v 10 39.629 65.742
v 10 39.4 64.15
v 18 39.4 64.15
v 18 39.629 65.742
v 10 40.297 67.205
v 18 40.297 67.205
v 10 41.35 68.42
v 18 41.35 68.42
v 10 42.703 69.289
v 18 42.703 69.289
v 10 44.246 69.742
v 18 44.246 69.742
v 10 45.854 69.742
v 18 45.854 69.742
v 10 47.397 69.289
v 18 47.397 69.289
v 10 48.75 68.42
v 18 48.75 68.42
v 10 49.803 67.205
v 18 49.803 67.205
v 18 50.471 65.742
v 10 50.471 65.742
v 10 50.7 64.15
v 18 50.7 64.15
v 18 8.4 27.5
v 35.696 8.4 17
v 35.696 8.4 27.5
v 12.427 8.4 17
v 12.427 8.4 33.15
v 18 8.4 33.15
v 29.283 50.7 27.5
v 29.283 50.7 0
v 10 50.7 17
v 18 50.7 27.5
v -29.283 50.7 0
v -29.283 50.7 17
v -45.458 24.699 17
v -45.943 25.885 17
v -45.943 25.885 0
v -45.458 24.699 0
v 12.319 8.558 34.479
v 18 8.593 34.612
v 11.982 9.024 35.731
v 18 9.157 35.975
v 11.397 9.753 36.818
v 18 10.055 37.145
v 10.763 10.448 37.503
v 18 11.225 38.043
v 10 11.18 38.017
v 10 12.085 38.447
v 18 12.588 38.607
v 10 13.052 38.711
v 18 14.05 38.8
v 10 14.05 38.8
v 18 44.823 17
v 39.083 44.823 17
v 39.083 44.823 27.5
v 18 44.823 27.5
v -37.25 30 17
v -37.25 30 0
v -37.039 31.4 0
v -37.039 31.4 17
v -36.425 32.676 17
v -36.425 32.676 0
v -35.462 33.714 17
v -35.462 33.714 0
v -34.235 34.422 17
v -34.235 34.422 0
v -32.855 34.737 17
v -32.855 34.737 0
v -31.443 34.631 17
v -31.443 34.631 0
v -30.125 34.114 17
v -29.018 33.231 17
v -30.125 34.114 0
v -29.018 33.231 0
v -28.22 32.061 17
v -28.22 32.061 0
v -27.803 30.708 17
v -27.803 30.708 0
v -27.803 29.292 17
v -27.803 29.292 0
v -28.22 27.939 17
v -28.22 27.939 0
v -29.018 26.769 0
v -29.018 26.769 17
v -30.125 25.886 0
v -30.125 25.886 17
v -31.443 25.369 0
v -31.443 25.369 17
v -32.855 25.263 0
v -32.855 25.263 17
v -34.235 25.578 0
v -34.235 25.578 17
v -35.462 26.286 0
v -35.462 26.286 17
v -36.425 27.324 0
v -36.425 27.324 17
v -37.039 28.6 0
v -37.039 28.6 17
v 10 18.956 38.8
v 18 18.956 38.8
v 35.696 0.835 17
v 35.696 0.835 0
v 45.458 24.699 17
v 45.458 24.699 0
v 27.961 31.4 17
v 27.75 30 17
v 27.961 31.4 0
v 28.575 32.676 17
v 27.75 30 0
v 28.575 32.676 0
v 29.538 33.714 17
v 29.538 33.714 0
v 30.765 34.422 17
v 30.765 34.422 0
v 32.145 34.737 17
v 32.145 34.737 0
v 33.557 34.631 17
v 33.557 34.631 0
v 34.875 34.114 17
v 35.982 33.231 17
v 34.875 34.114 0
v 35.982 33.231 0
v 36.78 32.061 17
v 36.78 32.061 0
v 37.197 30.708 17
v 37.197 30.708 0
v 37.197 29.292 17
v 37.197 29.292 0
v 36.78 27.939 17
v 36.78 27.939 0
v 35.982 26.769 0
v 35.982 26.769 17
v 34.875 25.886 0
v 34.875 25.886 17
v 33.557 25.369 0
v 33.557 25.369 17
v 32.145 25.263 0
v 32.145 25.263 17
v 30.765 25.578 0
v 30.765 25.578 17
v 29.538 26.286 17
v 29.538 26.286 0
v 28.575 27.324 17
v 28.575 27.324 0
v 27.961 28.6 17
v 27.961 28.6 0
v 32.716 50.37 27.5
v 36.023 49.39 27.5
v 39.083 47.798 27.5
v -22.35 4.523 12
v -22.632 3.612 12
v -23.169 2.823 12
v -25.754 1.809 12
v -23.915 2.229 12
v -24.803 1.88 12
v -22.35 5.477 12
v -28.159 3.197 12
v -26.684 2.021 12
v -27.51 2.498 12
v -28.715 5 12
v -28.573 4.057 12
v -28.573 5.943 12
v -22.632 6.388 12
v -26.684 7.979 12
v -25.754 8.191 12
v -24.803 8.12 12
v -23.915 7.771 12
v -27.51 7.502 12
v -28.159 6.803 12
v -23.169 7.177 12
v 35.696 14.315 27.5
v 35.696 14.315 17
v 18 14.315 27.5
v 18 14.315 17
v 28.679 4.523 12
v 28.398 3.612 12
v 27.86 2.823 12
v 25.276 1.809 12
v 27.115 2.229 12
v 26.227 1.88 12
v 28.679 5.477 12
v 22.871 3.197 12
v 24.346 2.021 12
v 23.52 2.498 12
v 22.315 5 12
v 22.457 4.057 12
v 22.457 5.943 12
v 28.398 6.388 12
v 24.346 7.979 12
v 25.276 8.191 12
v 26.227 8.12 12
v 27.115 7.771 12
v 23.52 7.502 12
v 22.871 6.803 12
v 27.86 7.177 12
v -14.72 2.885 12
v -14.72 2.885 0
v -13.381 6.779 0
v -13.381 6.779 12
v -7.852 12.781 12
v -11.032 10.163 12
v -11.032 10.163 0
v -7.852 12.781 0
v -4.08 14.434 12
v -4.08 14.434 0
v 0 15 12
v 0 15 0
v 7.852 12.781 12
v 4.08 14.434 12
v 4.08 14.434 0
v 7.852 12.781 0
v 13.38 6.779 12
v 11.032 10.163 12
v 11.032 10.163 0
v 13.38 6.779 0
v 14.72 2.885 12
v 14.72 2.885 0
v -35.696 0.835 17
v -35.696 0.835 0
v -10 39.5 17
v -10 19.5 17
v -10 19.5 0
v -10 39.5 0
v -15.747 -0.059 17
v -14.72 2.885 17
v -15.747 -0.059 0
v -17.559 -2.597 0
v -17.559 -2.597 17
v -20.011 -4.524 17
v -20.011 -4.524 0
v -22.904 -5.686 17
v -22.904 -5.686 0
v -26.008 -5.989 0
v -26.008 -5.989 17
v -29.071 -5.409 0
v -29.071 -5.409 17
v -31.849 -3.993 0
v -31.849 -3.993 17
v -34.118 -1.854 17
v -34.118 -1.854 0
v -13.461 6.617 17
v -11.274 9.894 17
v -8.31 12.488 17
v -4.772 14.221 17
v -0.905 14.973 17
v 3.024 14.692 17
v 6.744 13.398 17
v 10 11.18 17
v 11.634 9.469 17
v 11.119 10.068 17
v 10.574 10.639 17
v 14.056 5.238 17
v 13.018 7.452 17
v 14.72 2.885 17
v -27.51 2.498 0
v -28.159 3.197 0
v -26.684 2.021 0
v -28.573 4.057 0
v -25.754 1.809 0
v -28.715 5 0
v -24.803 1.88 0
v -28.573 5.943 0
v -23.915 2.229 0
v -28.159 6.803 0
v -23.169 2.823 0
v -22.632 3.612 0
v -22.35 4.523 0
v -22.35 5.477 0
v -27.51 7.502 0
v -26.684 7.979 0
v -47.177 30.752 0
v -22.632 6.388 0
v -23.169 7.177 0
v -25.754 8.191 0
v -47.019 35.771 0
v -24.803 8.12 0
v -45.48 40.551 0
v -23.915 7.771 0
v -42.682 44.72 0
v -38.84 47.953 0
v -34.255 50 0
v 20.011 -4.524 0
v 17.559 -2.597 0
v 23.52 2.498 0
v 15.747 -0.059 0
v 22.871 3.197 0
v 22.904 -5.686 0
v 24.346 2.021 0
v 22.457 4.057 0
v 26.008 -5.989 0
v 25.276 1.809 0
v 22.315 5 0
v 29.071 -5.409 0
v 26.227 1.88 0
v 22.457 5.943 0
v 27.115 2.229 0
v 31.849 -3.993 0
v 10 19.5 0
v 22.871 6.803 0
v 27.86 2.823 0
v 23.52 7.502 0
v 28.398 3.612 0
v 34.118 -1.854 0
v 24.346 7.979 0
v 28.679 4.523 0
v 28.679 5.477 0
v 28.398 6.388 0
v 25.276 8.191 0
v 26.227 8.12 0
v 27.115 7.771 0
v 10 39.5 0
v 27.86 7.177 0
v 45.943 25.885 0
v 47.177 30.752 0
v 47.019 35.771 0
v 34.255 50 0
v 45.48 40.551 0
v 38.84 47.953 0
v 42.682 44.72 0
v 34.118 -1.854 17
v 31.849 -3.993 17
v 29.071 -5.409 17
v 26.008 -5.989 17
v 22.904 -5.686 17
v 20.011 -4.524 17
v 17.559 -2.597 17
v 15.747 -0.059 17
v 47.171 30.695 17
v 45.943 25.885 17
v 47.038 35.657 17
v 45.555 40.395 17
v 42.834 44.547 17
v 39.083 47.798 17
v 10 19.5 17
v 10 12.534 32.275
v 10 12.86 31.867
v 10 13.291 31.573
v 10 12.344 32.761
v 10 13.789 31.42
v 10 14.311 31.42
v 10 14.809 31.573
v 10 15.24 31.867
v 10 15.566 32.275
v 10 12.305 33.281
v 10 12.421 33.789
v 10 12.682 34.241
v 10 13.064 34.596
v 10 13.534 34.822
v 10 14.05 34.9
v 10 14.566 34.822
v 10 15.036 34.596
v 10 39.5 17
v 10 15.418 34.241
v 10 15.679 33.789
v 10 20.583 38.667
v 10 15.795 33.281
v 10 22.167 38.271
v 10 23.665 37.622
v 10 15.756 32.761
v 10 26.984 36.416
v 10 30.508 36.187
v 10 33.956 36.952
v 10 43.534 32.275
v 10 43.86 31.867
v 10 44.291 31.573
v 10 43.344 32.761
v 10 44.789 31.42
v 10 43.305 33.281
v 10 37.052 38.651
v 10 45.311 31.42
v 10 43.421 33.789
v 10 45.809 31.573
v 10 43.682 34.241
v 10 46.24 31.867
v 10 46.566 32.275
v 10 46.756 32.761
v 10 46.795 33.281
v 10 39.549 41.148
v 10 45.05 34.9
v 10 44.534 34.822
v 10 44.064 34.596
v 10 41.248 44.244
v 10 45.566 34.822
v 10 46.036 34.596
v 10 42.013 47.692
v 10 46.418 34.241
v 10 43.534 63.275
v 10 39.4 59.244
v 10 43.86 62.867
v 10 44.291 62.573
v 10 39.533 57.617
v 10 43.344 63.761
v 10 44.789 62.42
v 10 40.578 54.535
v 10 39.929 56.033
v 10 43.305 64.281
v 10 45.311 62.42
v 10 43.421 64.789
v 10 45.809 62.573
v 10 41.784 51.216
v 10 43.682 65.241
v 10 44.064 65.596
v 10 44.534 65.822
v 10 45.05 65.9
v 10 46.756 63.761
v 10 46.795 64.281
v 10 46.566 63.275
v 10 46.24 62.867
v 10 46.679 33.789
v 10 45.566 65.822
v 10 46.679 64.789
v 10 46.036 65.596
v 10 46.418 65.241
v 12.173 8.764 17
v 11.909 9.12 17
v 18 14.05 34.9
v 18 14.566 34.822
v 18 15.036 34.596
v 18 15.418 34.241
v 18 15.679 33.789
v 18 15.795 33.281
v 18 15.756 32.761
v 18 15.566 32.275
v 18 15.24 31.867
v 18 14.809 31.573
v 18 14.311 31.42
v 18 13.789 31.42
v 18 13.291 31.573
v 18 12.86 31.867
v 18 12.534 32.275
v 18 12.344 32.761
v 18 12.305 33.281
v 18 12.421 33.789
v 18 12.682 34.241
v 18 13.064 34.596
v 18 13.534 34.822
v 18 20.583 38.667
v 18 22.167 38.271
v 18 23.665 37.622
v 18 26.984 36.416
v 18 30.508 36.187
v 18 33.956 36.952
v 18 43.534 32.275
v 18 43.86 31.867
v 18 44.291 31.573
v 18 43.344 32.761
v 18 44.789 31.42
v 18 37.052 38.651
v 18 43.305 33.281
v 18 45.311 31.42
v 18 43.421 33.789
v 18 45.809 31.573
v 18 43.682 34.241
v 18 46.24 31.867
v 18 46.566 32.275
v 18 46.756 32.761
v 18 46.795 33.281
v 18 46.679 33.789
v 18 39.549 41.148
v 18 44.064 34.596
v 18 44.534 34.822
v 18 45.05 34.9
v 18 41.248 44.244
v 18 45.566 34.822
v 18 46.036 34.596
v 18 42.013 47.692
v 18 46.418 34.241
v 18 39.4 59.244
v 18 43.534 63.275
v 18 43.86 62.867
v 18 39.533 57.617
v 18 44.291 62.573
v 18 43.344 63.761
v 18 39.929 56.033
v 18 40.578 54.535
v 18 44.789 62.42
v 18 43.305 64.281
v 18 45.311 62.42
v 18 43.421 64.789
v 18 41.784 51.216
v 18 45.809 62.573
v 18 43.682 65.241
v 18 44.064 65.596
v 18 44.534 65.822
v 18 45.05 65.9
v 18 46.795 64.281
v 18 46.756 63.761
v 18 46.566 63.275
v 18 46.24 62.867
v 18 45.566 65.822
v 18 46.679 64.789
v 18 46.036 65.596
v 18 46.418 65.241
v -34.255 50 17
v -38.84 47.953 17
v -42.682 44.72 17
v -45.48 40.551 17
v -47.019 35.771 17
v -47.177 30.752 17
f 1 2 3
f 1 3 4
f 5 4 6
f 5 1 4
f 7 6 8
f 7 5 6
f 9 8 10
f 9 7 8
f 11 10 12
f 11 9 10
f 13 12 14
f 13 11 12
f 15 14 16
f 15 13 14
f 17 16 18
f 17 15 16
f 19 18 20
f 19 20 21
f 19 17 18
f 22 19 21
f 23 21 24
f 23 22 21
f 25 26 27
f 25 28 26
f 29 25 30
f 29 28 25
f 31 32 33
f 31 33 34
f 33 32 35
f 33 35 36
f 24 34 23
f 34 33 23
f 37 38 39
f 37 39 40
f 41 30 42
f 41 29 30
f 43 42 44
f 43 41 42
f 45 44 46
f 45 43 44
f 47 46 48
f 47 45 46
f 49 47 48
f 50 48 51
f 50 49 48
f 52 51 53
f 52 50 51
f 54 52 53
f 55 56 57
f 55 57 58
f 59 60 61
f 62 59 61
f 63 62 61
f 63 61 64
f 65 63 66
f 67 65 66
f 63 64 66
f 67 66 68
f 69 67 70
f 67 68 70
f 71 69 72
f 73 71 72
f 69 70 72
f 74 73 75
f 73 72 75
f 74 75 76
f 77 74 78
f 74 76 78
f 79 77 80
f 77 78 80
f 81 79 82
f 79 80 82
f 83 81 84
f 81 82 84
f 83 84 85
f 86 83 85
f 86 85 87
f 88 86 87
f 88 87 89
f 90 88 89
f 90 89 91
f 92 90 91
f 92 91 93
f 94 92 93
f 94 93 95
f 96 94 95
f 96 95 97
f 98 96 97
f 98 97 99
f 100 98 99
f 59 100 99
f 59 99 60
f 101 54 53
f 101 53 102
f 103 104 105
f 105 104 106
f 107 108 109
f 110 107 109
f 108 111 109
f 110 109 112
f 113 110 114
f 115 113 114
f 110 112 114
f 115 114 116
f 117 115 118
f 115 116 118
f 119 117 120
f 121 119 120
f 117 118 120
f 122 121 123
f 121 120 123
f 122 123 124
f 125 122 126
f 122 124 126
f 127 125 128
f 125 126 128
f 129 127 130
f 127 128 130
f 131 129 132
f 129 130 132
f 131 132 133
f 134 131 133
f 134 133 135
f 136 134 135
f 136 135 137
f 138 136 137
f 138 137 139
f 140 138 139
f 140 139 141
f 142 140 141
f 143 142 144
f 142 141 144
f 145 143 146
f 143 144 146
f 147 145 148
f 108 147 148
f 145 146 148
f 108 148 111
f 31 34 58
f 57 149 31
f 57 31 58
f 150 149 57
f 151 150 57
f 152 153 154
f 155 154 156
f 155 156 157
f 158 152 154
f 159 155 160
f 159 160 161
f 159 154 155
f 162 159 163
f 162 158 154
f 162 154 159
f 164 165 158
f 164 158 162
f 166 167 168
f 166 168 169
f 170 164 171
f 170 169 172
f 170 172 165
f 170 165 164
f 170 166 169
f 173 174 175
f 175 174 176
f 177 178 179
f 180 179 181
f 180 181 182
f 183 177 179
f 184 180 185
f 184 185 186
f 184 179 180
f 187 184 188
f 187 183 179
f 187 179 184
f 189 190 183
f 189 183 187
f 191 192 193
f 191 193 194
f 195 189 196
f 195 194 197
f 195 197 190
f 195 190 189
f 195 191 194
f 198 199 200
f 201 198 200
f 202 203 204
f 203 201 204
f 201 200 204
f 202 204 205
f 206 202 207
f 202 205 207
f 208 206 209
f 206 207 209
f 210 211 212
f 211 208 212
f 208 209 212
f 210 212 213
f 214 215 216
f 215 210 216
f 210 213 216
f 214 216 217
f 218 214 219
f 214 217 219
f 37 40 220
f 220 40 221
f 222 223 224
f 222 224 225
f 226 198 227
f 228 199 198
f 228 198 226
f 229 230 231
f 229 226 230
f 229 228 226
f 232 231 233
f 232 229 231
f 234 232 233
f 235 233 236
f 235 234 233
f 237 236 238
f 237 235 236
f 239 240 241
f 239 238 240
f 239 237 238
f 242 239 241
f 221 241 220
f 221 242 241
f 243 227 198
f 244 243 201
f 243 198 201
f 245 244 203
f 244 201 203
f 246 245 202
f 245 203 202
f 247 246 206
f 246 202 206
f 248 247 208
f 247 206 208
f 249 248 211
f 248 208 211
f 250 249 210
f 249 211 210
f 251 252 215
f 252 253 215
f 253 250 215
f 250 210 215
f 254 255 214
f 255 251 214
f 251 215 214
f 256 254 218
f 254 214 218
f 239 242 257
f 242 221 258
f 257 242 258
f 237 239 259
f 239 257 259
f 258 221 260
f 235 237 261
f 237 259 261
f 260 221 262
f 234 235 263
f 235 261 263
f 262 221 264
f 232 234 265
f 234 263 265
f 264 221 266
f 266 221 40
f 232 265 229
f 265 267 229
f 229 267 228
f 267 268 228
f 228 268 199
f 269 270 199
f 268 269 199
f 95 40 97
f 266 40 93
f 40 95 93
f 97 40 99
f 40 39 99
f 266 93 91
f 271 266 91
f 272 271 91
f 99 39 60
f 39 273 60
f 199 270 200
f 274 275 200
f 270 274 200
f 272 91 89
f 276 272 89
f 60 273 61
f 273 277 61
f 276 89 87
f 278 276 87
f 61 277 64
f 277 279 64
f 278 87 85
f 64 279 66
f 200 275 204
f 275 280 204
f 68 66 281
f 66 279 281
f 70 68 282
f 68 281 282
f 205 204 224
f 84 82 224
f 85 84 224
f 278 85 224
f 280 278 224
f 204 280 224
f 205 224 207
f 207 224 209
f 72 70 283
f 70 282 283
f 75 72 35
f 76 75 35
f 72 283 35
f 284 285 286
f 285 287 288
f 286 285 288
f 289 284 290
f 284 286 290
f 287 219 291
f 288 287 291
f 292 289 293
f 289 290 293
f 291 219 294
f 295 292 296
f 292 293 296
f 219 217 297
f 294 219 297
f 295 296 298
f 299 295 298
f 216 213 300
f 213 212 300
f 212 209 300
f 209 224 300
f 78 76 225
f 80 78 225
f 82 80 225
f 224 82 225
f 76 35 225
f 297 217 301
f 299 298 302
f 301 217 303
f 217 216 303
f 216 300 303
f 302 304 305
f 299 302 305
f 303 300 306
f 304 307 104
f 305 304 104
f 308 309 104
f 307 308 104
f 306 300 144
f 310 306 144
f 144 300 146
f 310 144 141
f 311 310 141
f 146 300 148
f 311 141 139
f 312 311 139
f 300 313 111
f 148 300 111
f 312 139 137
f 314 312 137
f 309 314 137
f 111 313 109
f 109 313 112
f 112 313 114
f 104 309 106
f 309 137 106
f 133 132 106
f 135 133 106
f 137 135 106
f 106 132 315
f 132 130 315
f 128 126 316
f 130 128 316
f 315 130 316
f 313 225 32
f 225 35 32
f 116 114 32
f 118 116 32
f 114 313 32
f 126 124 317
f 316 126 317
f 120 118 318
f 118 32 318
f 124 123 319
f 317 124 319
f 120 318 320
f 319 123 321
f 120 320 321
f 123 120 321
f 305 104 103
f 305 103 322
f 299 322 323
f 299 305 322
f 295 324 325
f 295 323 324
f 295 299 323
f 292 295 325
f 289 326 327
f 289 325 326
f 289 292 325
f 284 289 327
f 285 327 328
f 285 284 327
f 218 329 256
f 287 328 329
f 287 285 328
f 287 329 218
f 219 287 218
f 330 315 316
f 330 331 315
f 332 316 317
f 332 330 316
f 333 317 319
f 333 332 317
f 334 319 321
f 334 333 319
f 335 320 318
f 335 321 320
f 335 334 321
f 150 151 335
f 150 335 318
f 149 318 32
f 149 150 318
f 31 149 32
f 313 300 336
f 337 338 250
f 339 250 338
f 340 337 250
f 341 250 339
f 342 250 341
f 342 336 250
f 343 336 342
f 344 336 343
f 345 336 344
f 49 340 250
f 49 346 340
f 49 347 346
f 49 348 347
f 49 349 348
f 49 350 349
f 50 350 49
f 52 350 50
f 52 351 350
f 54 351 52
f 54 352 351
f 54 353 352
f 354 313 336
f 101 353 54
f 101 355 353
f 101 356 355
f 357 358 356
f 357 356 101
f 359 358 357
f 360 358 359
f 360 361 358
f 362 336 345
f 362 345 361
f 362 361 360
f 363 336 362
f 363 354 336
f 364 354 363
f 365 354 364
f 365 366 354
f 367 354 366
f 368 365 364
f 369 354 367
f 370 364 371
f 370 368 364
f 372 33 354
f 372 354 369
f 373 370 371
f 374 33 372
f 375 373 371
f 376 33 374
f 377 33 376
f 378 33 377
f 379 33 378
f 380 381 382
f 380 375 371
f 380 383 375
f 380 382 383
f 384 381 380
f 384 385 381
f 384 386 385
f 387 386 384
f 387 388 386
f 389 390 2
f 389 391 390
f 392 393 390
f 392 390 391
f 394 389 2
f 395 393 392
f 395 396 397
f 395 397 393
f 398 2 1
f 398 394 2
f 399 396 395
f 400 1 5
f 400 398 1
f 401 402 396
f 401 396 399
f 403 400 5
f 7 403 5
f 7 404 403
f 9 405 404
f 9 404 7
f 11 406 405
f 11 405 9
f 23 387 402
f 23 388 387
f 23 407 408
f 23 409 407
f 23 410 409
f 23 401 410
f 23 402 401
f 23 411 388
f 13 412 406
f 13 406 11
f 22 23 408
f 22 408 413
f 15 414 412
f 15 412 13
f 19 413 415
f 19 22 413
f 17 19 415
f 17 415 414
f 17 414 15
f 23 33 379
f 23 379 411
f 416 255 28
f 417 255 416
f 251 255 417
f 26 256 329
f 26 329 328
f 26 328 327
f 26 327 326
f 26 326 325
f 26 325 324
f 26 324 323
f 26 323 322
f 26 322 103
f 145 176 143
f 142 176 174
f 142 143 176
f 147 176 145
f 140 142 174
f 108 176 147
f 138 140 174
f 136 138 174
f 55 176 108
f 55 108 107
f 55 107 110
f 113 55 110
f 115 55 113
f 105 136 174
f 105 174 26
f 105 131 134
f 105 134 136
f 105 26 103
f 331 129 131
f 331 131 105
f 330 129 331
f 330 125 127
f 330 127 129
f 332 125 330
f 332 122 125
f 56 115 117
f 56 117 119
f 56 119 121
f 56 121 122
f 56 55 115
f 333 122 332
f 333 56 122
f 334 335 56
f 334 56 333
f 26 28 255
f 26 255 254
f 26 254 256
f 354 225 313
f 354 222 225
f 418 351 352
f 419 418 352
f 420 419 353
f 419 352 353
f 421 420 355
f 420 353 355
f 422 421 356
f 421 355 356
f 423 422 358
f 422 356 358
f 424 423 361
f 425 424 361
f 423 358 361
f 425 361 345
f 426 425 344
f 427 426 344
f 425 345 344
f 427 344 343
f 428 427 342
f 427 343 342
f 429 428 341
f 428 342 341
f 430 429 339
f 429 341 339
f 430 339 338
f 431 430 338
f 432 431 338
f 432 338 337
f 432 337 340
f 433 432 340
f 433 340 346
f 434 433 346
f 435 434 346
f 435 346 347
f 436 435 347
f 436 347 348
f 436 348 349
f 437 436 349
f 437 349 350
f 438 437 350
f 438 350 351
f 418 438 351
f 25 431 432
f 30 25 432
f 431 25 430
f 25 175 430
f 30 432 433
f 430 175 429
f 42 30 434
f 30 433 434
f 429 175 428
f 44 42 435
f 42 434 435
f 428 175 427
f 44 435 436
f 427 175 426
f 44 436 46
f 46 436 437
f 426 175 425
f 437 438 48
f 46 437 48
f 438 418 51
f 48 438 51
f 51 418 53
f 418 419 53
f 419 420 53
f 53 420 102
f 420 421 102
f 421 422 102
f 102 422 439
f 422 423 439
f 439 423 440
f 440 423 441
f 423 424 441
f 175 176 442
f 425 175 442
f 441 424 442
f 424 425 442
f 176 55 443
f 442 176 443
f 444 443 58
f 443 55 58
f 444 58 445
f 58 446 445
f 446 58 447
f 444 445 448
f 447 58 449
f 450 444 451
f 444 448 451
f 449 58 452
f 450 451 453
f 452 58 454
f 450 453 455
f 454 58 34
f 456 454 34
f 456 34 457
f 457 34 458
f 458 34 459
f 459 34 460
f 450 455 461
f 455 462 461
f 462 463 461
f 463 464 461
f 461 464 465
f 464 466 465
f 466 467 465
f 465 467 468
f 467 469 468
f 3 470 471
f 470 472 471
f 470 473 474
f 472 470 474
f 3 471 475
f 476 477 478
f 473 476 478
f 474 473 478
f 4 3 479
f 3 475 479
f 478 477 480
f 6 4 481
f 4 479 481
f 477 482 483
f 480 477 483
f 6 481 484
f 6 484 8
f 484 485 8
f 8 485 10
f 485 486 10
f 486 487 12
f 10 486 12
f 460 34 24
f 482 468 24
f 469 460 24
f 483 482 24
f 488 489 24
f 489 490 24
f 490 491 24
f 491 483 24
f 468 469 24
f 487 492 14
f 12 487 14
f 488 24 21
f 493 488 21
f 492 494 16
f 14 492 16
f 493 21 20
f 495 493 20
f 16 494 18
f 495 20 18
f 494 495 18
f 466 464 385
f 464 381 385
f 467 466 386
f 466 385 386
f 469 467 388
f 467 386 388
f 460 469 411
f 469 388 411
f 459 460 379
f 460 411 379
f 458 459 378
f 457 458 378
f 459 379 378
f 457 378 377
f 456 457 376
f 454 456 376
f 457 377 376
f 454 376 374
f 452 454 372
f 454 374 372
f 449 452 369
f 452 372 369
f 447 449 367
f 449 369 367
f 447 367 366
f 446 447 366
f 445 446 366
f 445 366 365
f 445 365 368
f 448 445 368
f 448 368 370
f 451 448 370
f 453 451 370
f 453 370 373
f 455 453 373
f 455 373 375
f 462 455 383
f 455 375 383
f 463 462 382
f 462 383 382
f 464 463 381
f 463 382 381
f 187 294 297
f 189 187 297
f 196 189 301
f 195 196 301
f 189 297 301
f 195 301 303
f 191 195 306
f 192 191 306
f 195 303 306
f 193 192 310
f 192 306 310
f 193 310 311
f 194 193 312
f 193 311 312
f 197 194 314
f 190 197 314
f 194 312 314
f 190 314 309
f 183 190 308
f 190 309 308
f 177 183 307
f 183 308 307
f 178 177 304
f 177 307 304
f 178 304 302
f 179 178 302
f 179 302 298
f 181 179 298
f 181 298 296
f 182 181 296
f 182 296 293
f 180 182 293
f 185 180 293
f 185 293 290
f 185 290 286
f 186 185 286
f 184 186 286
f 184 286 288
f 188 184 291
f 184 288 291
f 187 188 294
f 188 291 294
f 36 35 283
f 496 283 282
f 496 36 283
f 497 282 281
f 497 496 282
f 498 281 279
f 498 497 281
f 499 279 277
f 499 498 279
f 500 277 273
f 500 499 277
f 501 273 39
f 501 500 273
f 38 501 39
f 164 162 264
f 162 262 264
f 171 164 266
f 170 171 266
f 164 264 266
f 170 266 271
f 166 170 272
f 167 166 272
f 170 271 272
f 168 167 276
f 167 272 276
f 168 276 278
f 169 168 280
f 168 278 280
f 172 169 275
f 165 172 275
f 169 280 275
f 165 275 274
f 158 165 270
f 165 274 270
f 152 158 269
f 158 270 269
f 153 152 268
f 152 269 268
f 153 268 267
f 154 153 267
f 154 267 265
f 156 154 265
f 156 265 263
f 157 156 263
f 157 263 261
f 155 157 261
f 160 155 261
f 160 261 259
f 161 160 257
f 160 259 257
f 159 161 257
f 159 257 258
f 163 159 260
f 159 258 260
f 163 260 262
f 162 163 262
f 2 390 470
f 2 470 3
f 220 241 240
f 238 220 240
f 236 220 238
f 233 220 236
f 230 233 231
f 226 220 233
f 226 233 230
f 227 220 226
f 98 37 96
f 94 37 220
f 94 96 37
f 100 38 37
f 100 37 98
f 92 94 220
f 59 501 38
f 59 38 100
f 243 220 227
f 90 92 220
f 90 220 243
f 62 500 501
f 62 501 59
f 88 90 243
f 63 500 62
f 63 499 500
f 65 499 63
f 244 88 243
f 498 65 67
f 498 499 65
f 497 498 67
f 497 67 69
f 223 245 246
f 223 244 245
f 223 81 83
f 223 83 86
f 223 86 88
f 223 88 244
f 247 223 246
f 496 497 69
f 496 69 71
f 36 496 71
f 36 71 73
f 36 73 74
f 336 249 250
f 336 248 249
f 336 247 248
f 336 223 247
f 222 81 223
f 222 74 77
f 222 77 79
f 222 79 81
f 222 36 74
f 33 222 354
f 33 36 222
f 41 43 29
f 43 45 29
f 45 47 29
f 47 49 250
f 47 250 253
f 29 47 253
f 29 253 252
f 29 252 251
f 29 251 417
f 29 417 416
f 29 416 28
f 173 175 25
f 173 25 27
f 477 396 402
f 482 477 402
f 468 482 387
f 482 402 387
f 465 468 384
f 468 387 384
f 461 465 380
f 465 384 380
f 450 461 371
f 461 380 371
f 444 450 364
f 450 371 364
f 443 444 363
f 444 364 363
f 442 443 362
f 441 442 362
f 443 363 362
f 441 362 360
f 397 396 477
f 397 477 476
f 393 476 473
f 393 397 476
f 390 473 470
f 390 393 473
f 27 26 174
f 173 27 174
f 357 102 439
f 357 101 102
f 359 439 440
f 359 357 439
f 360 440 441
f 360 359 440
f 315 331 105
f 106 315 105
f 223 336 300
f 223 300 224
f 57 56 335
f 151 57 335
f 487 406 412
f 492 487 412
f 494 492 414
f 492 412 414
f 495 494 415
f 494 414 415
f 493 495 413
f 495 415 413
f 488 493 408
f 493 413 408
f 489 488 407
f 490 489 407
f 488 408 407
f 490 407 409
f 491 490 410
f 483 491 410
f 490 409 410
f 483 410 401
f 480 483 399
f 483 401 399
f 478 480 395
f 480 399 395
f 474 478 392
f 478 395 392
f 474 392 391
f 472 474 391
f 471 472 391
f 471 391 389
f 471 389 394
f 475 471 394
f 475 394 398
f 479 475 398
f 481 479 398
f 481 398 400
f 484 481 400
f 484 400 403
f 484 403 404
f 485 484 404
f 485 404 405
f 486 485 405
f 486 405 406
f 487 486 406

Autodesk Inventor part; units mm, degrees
ref_plane "YZ Plane" through (0, 0, 0) normal (1, 0, 0) x (0, 1, 0)
ref_plane "XZ Plane" through (0, 0, 0) normal (0, 1, 0) x (-1, 0, 0)
ref_plane "XY Plane" through (0, 0, 0) normal (0, 0, 1) x (1, 0, 0)
sketch "Sketch1" plane through (0, 0, 0) normal (0, 0, 1) x (1, 0, 0)
  circle A0 centre (0, 0) radius 8
  circle A1 centre (25.5147, 5) radius 3
  circle A2 centre (-25.5147, 5) radius 3
  circle A3 centre (32.5, 30) radius 5
  circle A4 centre (-32.5, 30) radius 5
  arc A5 (45.4578, 24.6994) -> (32.5, 44) centre (32.5, 30) ccw
  arc A6 (-32.5, 44) -> (-45.4578, 24.6994) centre (-32.5, 30) ccw
  line L0 (-24.3676, 0) -> (22.7562, 0) construction
  line L1 (-38.3266, 30) -> (45.5284, 30) construction
  line L2 (-33.7528, 8) -> (48.0284, 8) construction
  circle A7 centre (-25.5147, 5) radius 6
  circle A8 centre (25.5147, 5) radius 6
  arc A9 (14.72, 2.8846) -> (-15, 0) centre (0, 0) ccw
  arc A10 (-35.6958, 0.8353) -> (-14.72, 2.8846) centre (-25.5147, 5) ccw
  arc A11 (14.72, 2.8846) -> (35.6958, 0.8353) centre (25.5147, 5) ccw
  line L3 (-45.4578, 24.6994) -> (-35.6958, 0.8353)
  line L4 (35.6958, 0.8353) -> (45.4578, 24.6994)
  line L5 (-32.5, 44) -> (32.5, 44)
  dimension "d0" = 65
  dimension "d1" = 32.5
  dimension "d2" = 10
  dimension "d3" = 10
  dimension "d4" = 6
  dimension "d5" = 6
  dimension "d6" = 28
  dimension "d7" = 28
  dimension "d14" = 16
  dimension "d16" = 15
  dimension "d18" = 12
  dimension "d19" = 12
  dimension "d20" = 30
  dimension "d33" = 30
  dimension "d34" = 15
extrude "Extrusion1" add sketch "Sketch1" along normal blind 12 contours L4 A11 A9 A10 L3 A6 L5 A5 | A7 | A8
sketch "Sketch2" plane through (0, 0, 12) normal (0, 0, 1) x (1, 0, 0)
  circle A0 centre (25.5147, 5) radius 3 projected
  circle A1 centre (-25.5147, 5) radius 3 projected
  circle A2 centre (-32.5, 30) radius 5 projected
  circle A3 centre (32.5, 30) radius 5 projected
  line L0 (-45.4578, 24.6994) -> (-35.6958, 0.8353) projected
  arc A4 (-35.6958, 0.8353) -> (-14.72, 2.8846) centre (-25.5147, 5) ccw projected
  arc A5 (14.72, 2.8846) -> (-14.72, 2.8846) centre (0, 0) ccw projected
  arc A6 (14.72, 2.8846) -> (35.6958, 0.8353) centre (25.5147, 5) ccw projected
  line L1 (35.6958, 0.8353) -> (45.4578, 24.6994) projected
  arc A7 (45.4578, 24.6994) -> (32.5, 44) centre (32.5, 30) ccw projected
  line L2 (32.5, 44) -> (-32.5, 44) projected
  arc A8 (-32.5, 44) -> (-45.4578, 24.6994) centre (-32.5, 30) ccw projected
  circle A9 centre (-32.5, 30) radius 5 projected
  circle A10 centre (-32.5, 30) radius 7.5
  circle A11 centre (32.5, 30) radius 5
extrude "Extrusion2" add sketch "Sketch2" along normal blind 5 contours A0 | A1 | A8 L2 A7 L1 A6 A5 A4 L0 | A10
sketch "Sketch3" plane through (0, 0, 17) normal (0, 0, 1) x (1, 0, 0)
  line L0 (-10, 39.5) -> (10, 39.5)
  line L1 (10, 39.5) -> (10, 19.5)
  line L2 (10, 19.5) -> (-10, 19.5)
  line L3 (-10, 19.5) -> (-10, 39.5)
  circle A0 centre (32.5, 30) radius 5 projected
  circle A1 centre (-32.5, 30) radius 5 projected
  line L4 (-45.4578, 24.6994) -> (-35.6958, 0.8353) projected
  arc A2 (-35.6958, 0.8353) -> (-14.72, 2.8846) centre (-25.5147, 5) ccw projected
  arc A3 (14.72, 2.8846) -> (-14.72, 2.8846) centre (0, 0) ccw projected
  arc A4 (14.72, 2.8846) -> (35.6958, 0.8353) centre (25.5147, 5) ccw projected
  line L5 (35.6958, 0.8353) -> (45.4578, 24.6994) projected
  arc A5 (45.4578, 24.6994) -> (32.5, 44) centre (32.5, 30) ccw projected
  line L6 (32.5, 44) -> (-32.5, 44) projected
  arc A6 (-32.5, 44) -> (-45.4578, 24.6994) centre (-32.5, 30) ccw projected
  dimension "d25" = 20
  dimension "d26" = 20
  dimension "d27" = 10
  dimension "d29" = 4.5
  dimension "d32" = 29
extrude "Extrusion3" cut sketch "Sketch3" against normal blind 17 contours L0 L1 L2 L3
sketch "Sketch7" plane through (0, 0, 17) normal (0, 0, 1) x (1, 0, 0)
  line L0 (-10, 19.5) -> (-10, 39.5) projected
  line L1 (-10, 39.5) -> (10, 39.5) projected
  line L2 (10, 39.5) -> (10, 19.5) projected
  line L3 (10, 19.5) -> (-10, 19.5) projected
  circle A0 centre (32.5, 30) radius 5 projected
  circle A1 centre (-32.5, 30) radius 5 projected
  line L4 (-45.4578, 24.6994) -> (-35.6958, 0.8353) projected
  arc A2 (-35.6958, 0.8353) -> (-14.72, 2.8846) centre (-25.5147, 5) ccw projected
  arc A3 (14.72, 2.8846) -> (-14.72, 2.8846) centre (0, 0) ccw projected
  arc A4 (14.72, 2.8846) -> (35.6958, 0.8353) centre (25.5147, 5) ccw projected
  line L5 (35.6958, 0.8353) -> (45.4578, 24.6994) projected
  arc A5 (45.4578, 24.6994) -> (32.5, 44) centre (32.5, 30) ccw projected
  line L6 (32.5, 44) -> (-32.5, 44) projected
  arc A6 (-32.5, 44) -> (-45.4578, 24.6994) centre (-32.5, 30) ccw projected
  line L7 (-32.5, 44) -> (32.5, 44)
  line L8 (32.5, 44) -> (32.5, 50.7)
  line L9 (29.2827, 50.7) -> (-29.2827, 50.7)
  line L10 (-32.5, 50.7) -> (-32.5, 44)
  line L11 (45.9427, 25.885) -> (35.6958, 0.8353)
  arc A7 (45.9427, 25.885) -> (29.2827, 50.7) centre (29.2827, 32.7) ccw
  line L12 (-45.9427, 25.885) -> (-35.6958, 0.8353)
  arc A8 (-29.2827, 50.7) -> (-45.9427, 25.885) centre (-29.2827, 32.7) ccw
  circle A9 centre (-32.5, 30) radius 5 projected
  arc A10 (-32.5, 44) -> (-45.4578, 24.6994) centre (-32.5, 30) ccw
  arc A11 (45.4578, 24.6994) -> (32.5, 44) centre (32.5, 30) ccw
  dimension "d55" = 6.7
  dimension "d56" = 18
  dimension "d57" = 18
extrude "Extrusion7" add sketch "Sketch7" against normal blind 17 contours L12 A8 L10 A6 | L10 A8 L9 A7 L8 L6 | L8 A7 L11 A5
sketch "Sketch8" plane through (0, 0, 17) normal (0, 0, 1) x (1, 0, 0)
  line L0 (-10, 19.5) -> (-10, 39.5) projected
  line L1 (-10, 39.5) -> (10, 39.5) projected
  line L2 (10, 39.5) -> (10, 19.5) projected
  line L3 (10, 19.5) -> (-10, 19.5) projected
  circle A0 centre (32.5, 30) radius 5 projected
  circle A1 centre (-32.5, 30) radius 5 projected
  line L4 (-45.9427, 25.885) -> (-35.6958, 0.8353) projected
  arc A2 (-35.6958, 0.8353) -> (-14.72, 2.8846) centre (-25.5147, 5) ccw projected
  arc A3 (14.72, 2.8846) -> (-14.72, 2.8846) centre (0, 0) ccw projected
  arc A4 (14.72, 2.8846) -> (35.6958, 0.8353) centre (25.5147, 5) ccw projected
  line L5 (35.6958, 0.8353) -> (45.9427, 25.885) projected
  arc A5 (45.9427, 25.885) -> (29.2827, 50.7) centre (29.2827, 32.7) ccw projected
  line L6 (29.2827, 50.7) -> (-29.2827, 50.7) projected
  arc A6 (-29.2827, 50.7) -> (-45.9427, 25.885) centre (-29.2827, 32.7) ccw projected
  line L7 (10, 50.7) -> (18, 50.7)
  line L8 (18, 50.7) -> (18, 8.4)
  line L9 (18, 8.4) -> (10, 8.4)
  line L10 (10, 8.4) -> (10, 50.7)
  line L11 (10, 39.5) -> (10, 19.5) projected
  line L12 (18, 50.7) -> (29.2827, 50.7)
  line L13 (29.2827, 50.7) -> (29.2827, 44.8229)
  line L14 (29.2827, 44.8229) -> (18, 44.8229)
  line L15 (18, 44.8229) -> (18, 50.7)
  line L16 (18, 8.4) -> (35.6958, 8.4)
  line L17 (35.6958, 8.4) -> (35.6958, 14.3153)
  line L18 (35.6958, 14.3153) -> (18, 14.3153)
  line L19 (18, 14.3153) -> (18, 8.4)
  line L20 (29.2827, 44.8229) -> (39.0827, 44.8229)
  line L21 (39.0827, 44.8229) -> (39.0827, 47.7984)
  arc A7 (39.0827, 47.7984) -> (29.2827, 50.7) centre (29.2827, 32.7) ccw
  dimension "d60" = 42.3
  dimension "d61" = 8
extrude "Extrusion8" add sketch "Sketch8" along normal blind 10.5 contours L2 L10 L6 L8 L9 A3 | A3 L9 L10 | L6 L13 L14 L8 | L8 L18 L17 L16 | A5 L21 L20 L13
sketch "Sketch9" plane through (10, 19.5, 0) normal (-1, 0, 0) x (0, 0, 1)
  line L0 (17, 20) -> (0, 20) projected
  line L1 (0, 0) -> (0, 20) projected
  line L2 (17, 0) -> (0, 0) projected
  line L3 (17, -8.3197) -> (17, 0) projected
  line L4 (17, -8.3197) -> (17, -11.1) projected
  line L5 (17, -11.1) -> (27.5, -11.1) projected
  line L6 (27.5, 31.2) -> (27.5, -11.1) projected
  line L7 (17, 31.2) -> (27.5, 31.2) projected
  line L8 (17, 20) -> (17, 31.2) projected
  arc A0 (54.5354, 21.0778) -> (37.6222, 4.1646) centre (48.65, 10.05) ccw
  circle A1 centre (33.15, 25.55) radius 1.75
  circle A2 centre (33.15, -5.45) radius 1.75
  circle A3 centre (64.15, 25.55) radius 1.75
  line L9 (27.5, 31.2) -> (69.8, 31.2)
  line L10 (59.2437, 19.9) -> (64.15, 19.9)
  arc A4 (64.15, 19.9) -> (64.15, 31.2) centre (64.15, 25.55) ccw
  arc A5 (33.15, -11.1) -> (38.8, -5.45) centre (33.15, -5.45) ccw
  line L11 (38.8, -5.45) -> (38.8, -0.5437)
  line L12 (27.5, -11.1) -> (33.15, -11.1)
  arc A6 (38.8, -0.5437) -> (37.6222, 4.1646) centre (28.8, -0.5437) ccw
  arc A7 (54.5354, 21.0778) -> (59.2437, 19.9) centre (59.2437, 29.9) ccw
  point P0 (0, -19.5)
  point P1 (56.3459, 19.9)
  point P2 (38.8, 2.3541)
  dimension "d64" = 25
  dimension "d65" = 21.15
  dimension "d66" = 21.15
  dimension "d67" = 5.65
  dimension "d68" = 5.65
  dimension "d69" = 5.65
  dimension "d70" = 5.65
  dimension "d71" = 5.65
  dimension "d72" = 31
  dimension "d73" = 3.5
  dimension "d74" = 3.5
  dimension "d75" = 3.5
  dimension "d76" = 42.3
  dimension "d77" = 5.65
  dimension "d78" = 11.3
  dimension "d79" = 10
  dimension "d80" = 10
extrude "Extrusion9" add sketch "Sketch9" against normal blind 8 contours L9 A4 L10 A7 A0 A6 L11 A5 L12 L6
sketch "Sketch10" plane through (0, 0, 17) normal (0, 0, -1) x (-1, 0, 0)
  arc A0 (-10, 11.1803) -> (-12.4274, 8.4) centre (0, 0) ccw
  line L0 (-12.4274, 8.4) -> (-10, 8.4)
  line L1 (-10, 8.4) -> (-10, 11.1803)
extrude "Extrusion10" cut sketch "Sketch10" against normal blind 41.25
sketch "Sketch11" plane through (0, 0, 0) normal (0, 0, -1) x (-1, 0, 0)
  line L0 (10, 39.5) -> (10, 19.5) projected
  line L1 (10, 19.5) -> (-10, 19.5) projected
  line L2 (-10, 19.5) -> (-10, 39.5) projected
  line L3 (-10, 39.5) -> (10, 39.5) projected
  circle A0 centre (-25.5147, 5) radius 3 projected
  circle A1 centre (25.5147, 5) radius 3 projected
  circle A2 centre (32.5, 30) radius 5 projected
  circle A3 centre (-32.5, 30) radius 5 projected
  line L4 (35.6958, 0.8353) -> (45.9427, 25.885) projected
  arc A4 (45.9427, 25.885) -> (29.2827, 50.7) centre (29.2827, 32.7) ccw projected
  line L5 (29.2827, 50.7) -> (-29.2827, 50.7) projected
  arc A5 (-29.2827, 50.7) -> (-45.9427, 25.885) centre (-29.2827, 32.7) ccw projected
  line L6 (-45.9427, 25.885) -> (-35.6958, 0.8353) projected
  arc A6 (-35.6958, 0.8353) -> (-14.72, 2.8846) centre (-25.5147, 5) ccw projected
  arc A7 (14.72, 2.8846) -> (-14.72, 2.8846) centre (0, 0) ccw projected
  arc A8 (14.72, 2.8846) -> (35.6958, 0.8353) centre (25.5147, 5) ccw projected
  circle A9 centre (-32.5, 30) radius 5
  circle A10 centre (-32.5, 30) radius 4.75
  circle A11 centre (32.5, 30) radius 5
  circle A12 centre (32.5, 30) radius 4.75
  circle A13 centre (25.5147, 5) radius 3.2
  circle A14 centre (-25.5147, 5) radius 3.2
  dimension "d91" = 10
  dimension "d92" = 9.5
  dimension "d93" = 10
  dimension "d94" = 9.5
  dimension "d95" = 6.4
  dimension "d96" = 6.4
extrude "Extrusion11" add sketch "Sketch11" against normal up to surface (17 mm away) contours A2 | A3
extrude "Extrusion12" cut sketch "Sketch11" against normal up to surface (12 mm away) contours A13 | A14
equation "\"d1\" = 0.5 * d0"
equation "\"d27\" = 0.5 * d26"
equation "\"d29\" = 0.5 * d32 - 0.5 * d25"
properties part number "BackStopper"
